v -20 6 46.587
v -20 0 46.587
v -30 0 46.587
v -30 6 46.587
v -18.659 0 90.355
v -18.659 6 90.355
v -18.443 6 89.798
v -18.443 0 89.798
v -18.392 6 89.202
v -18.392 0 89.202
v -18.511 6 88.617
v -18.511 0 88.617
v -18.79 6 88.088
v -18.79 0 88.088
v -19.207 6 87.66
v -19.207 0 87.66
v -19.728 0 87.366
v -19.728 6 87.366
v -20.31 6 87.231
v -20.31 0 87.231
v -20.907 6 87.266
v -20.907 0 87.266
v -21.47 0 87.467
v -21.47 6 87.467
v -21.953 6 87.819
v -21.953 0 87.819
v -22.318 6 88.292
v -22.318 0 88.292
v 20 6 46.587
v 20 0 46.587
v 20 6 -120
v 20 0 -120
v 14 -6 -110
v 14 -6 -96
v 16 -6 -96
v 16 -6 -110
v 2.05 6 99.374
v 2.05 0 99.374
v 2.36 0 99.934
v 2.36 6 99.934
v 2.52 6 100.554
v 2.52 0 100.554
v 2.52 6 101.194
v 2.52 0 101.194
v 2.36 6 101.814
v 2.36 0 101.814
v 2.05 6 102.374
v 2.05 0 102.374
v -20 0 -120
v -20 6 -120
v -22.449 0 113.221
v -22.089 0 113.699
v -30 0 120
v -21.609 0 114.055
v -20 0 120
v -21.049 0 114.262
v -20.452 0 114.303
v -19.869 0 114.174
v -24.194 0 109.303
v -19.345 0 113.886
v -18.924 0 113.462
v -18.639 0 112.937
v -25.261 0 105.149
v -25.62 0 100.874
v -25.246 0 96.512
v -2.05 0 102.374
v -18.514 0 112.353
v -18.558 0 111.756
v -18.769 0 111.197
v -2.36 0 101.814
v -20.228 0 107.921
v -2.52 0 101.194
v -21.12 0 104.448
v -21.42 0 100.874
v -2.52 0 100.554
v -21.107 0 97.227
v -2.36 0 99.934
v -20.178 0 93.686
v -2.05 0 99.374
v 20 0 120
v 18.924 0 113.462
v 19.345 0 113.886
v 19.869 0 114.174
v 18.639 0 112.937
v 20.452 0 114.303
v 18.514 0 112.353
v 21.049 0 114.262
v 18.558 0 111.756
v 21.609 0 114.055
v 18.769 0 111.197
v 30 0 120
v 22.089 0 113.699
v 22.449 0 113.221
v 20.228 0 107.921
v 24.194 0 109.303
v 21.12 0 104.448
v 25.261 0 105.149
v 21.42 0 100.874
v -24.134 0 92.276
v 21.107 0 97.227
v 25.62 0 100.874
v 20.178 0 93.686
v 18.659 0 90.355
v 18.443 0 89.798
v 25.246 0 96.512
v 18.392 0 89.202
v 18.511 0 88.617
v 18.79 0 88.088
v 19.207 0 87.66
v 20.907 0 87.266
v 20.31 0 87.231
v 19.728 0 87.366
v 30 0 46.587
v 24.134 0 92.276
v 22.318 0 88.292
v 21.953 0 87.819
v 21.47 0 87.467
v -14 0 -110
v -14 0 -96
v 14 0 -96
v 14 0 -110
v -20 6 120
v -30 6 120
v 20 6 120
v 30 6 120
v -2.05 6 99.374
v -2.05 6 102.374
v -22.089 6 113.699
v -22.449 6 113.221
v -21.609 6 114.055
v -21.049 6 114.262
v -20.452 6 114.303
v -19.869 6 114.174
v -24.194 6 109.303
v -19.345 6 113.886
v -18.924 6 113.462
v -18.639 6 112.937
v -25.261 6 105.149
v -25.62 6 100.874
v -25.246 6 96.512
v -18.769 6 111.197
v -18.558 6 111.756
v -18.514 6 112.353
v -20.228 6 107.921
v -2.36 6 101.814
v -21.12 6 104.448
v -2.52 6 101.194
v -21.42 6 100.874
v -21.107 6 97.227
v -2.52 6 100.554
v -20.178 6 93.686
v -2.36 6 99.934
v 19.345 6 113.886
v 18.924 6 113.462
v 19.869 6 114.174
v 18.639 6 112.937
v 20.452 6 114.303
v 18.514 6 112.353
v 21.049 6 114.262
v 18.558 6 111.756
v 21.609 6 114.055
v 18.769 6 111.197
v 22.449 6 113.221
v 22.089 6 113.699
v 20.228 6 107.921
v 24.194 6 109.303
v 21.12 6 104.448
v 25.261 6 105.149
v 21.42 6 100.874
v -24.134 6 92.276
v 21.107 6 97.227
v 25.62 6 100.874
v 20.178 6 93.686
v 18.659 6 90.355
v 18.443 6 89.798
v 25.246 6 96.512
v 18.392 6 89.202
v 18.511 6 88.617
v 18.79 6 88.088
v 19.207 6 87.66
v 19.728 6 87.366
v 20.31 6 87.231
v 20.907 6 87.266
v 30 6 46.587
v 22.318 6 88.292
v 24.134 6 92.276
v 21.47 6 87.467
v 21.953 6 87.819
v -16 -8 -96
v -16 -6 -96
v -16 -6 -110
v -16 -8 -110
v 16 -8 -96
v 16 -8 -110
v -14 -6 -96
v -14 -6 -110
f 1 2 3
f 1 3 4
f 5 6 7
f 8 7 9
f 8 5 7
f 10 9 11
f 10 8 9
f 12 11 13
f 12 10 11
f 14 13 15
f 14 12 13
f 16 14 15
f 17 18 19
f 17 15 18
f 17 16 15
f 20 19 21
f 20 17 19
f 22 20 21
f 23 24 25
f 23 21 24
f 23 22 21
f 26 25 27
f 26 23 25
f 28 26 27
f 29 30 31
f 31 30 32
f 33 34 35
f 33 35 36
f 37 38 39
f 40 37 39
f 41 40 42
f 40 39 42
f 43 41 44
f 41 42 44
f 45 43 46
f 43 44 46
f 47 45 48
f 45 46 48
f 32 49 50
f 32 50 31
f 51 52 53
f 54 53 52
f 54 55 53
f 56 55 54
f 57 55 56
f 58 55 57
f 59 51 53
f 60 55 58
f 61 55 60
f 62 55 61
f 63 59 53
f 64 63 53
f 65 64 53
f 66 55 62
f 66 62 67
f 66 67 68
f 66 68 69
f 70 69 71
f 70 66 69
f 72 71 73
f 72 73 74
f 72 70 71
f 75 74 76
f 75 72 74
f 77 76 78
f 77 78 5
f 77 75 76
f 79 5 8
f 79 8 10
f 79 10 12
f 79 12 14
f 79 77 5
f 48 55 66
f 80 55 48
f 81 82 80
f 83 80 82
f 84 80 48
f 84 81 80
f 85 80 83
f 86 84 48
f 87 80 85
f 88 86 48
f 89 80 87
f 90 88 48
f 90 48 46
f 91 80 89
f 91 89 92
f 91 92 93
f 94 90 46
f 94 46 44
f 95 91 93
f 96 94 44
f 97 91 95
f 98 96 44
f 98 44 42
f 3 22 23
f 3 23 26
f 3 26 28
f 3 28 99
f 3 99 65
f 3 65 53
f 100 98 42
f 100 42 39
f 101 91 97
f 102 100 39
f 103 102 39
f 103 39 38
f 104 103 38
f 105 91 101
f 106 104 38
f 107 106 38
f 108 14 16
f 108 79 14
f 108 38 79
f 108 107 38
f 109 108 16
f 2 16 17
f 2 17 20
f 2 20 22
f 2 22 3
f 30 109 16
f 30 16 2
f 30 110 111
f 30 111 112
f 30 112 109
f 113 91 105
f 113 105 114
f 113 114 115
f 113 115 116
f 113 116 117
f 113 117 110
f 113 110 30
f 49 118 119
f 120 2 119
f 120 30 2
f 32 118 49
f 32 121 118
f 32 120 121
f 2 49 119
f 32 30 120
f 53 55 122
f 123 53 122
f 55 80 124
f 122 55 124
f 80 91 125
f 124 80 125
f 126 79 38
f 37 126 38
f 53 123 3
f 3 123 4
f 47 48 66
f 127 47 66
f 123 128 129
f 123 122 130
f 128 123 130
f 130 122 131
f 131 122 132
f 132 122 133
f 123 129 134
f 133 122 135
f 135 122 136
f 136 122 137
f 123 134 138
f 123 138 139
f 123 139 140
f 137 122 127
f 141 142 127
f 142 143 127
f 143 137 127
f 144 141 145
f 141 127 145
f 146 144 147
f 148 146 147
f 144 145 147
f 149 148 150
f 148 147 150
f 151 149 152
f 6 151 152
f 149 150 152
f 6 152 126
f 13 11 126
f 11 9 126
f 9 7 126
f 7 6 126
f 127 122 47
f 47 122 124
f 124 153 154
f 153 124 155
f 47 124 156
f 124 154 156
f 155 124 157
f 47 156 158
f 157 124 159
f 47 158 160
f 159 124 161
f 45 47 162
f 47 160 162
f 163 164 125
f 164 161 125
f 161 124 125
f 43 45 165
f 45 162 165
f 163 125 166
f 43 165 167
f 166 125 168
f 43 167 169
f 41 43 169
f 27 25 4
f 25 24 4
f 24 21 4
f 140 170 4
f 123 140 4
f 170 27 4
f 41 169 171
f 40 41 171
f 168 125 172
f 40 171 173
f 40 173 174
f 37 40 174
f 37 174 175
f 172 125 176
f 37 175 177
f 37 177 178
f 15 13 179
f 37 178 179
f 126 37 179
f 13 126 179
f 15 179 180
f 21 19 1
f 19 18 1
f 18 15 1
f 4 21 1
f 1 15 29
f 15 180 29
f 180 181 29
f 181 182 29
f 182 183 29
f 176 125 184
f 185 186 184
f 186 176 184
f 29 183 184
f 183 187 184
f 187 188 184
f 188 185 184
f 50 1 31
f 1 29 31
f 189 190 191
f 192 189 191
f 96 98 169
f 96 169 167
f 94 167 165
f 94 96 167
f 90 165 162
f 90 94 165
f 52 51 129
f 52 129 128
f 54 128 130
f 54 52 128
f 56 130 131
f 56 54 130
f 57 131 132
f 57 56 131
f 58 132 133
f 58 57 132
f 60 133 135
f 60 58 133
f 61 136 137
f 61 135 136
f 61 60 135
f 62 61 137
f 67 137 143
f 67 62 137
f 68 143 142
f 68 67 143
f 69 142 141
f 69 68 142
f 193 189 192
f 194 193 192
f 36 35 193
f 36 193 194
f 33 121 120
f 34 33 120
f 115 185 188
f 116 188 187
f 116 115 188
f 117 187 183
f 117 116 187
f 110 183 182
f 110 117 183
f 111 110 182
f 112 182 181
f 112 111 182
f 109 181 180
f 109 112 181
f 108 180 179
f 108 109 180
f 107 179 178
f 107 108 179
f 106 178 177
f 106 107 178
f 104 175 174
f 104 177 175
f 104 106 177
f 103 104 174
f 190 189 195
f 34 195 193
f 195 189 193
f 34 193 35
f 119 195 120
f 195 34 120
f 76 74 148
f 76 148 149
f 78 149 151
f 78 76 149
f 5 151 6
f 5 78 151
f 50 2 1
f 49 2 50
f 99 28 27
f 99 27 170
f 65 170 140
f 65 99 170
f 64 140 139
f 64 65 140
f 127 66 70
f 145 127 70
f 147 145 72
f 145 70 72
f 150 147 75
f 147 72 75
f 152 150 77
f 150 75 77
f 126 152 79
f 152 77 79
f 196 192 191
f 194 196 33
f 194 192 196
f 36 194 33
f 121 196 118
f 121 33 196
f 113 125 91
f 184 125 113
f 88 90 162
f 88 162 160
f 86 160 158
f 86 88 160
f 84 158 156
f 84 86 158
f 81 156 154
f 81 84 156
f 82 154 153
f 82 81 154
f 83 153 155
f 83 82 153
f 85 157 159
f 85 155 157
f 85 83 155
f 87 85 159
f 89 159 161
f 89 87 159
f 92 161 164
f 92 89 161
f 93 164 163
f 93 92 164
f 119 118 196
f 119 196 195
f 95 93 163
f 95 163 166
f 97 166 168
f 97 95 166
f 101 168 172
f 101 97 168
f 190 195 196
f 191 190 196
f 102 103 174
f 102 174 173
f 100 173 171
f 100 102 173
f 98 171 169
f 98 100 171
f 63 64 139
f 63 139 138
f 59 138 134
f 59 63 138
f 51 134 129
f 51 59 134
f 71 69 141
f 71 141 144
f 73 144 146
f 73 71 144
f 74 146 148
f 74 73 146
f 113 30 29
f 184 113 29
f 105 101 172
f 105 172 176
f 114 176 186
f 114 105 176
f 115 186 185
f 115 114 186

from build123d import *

# Parameters (mm, degrees)
SKETCH1_W                = 40
SKETCH1_H                = 240
BOSS_EXTRUDE1_DEPTH      = 6
SKETCH3_W                = 73.413063841
SKETCH3_H                = 6
BOSS_EXTRUDE2_DEPTH      = 10
BOSS_EXTRUDE2_DEPTH_BACK = 50
SKETCH4_W                = 28
SKETCH4_H                = 14
BOSS_EXTRUDE3_DEPTH      = 8
SKETCH5_W                = 14
SKETCH5_H                = 2
BOSS_EXTRUDE4_DEPTH      = 2
BOSS_EXTRUDE4_DEPTH_BACK = 30
CUT_EXTRUDE1_DEPTH       = 10


with BuildPart() as part:
    # Sketch1 → Boss-Extrude1 (new body)
    with BuildSketch(Plane(origin=(0, 0, 0), x_dir=(1, 0, 0), z_dir=(0, 1, 0))):
        Rectangle(SKETCH1_W, SKETCH1_H)
    extrude(amount=BOSS_EXTRUDE1_DEPTH)

    # Sketch3 → Boss-Extrude2 (add, two sides)
    with BuildSketch(Plane(origin=(20, 0, 0), x_dir=(0, 0, -1), z_dir=(1, 0, 0))) as boss_extrude2_sk:
        with Locations((-83.29346808, 3)):
            Rectangle(SKETCH3_W, SKETCH3_H)
    extrude(amount=BOSS_EXTRUDE2_DEPTH)
    extrude(boss_extrude2_sk.sketch, amount=-BOSS_EXTRUDE2_DEPTH_BACK)

    # Sketch4 → Boss-Extrude3 (add)
    with BuildSketch(Plane.XZ):
        with Locations((0, -103)):
            Rectangle(SKETCH4_W, SKETCH4_H)
    extrude(amount=BOSS_EXTRUDE3_DEPTH)

    # Sketch5 → Boss-Extrude4 (add, two sides)
    with BuildSketch(Plane(origin=(14, 0, 0), x_dir=(0, 0, -1), z_dir=(1, 0, 0))) as boss_extrude4_sk:
        with Locations((103, -7)):
            Rectangle(SKETCH5_W, SKETCH5_H)
    extrude(amount=BOSS_EXTRUDE4_DEPTH)
    extrude(boss_extrude4_sk.sketch, amount=-BOSS_EXTRUDE4_DEPTH_BACK)

    # Sketch2 → Cut-Extrude1 (cut)
    with BuildSketch(Plane.XZ):
        with BuildLine():
            Line((-2.05, 99.374369573), (2.05, 99.374369573))
            ThreePointArc((2.05, 99.374369573), (2.540177159, 100.874369573), (2.05, 102.374369573))
            Line((2.05, 102.374369573), (-2.05, 102.374369573))
            ThreePointArc((-2.05, 102.374369573), (-2.540177159, 100.874369573), (-2.05, 99.374369573))
        make_face()
        with BuildLine():
            ThreePointArc((-21.42, 100.874369573), (-20.718261003, 95.436533515), (-18.659023249, 90.354994526))
            ThreePointArc((-18.659023249, 90.354994526), (-19.457027975, 87.494367242), (-22.317655259, 88.292371968))
            ThreePointArc((-22.317655259, 88.292371968), (-24.780665122, 94.37029115), (-25.62, 100.874369573))
            ThreePointArc((-25.62, 100.874369573), (-24.814500332, 107.248141867), (-22.44865158, 113.221127942))
            ThreePointArc((-22.44865158, 113.221127942), (-19.596568798, 114.049151976), (-18.768544764, 111.197069193))
            ThreePointArc((-18.768544764, 111.197069193), (-20.746549458, 106.203261163), (-21.42, 100.874369573))
        make_face()
        with BuildLine():
            ThreePointArc((25.62, 100.874369573), (24.780665122, 94.37029115), (22.317655259, 88.292371968))
            ThreePointArc((22.317655259, 88.292371968), (19.457027975, 87.494367242), (18.659023249, 90.354994526))
            ThreePointArc((18.659023249, 90.354994526), (20.718261003, 95.436533515), (21.42, 100.874369573))
            ThreePointArc((21.42, 100.874369573), (20.746549458, 106.203261163), (18.768544764, 111.197069193))
            ThreePointArc((18.768544764, 111.197069193), (19.596568798, 114.049151976), (22.44865158, 113.221127942))
            ThreePointArc((22.44865158, 113.221127942), (24.814500332, 107.248141867), (25.62, 100.874369573))
        make_face()
    extrude(amount=-CUT_EXTRUDE1_DEPTH, mode=Mode.SUBTRACT)


solid = part.part
